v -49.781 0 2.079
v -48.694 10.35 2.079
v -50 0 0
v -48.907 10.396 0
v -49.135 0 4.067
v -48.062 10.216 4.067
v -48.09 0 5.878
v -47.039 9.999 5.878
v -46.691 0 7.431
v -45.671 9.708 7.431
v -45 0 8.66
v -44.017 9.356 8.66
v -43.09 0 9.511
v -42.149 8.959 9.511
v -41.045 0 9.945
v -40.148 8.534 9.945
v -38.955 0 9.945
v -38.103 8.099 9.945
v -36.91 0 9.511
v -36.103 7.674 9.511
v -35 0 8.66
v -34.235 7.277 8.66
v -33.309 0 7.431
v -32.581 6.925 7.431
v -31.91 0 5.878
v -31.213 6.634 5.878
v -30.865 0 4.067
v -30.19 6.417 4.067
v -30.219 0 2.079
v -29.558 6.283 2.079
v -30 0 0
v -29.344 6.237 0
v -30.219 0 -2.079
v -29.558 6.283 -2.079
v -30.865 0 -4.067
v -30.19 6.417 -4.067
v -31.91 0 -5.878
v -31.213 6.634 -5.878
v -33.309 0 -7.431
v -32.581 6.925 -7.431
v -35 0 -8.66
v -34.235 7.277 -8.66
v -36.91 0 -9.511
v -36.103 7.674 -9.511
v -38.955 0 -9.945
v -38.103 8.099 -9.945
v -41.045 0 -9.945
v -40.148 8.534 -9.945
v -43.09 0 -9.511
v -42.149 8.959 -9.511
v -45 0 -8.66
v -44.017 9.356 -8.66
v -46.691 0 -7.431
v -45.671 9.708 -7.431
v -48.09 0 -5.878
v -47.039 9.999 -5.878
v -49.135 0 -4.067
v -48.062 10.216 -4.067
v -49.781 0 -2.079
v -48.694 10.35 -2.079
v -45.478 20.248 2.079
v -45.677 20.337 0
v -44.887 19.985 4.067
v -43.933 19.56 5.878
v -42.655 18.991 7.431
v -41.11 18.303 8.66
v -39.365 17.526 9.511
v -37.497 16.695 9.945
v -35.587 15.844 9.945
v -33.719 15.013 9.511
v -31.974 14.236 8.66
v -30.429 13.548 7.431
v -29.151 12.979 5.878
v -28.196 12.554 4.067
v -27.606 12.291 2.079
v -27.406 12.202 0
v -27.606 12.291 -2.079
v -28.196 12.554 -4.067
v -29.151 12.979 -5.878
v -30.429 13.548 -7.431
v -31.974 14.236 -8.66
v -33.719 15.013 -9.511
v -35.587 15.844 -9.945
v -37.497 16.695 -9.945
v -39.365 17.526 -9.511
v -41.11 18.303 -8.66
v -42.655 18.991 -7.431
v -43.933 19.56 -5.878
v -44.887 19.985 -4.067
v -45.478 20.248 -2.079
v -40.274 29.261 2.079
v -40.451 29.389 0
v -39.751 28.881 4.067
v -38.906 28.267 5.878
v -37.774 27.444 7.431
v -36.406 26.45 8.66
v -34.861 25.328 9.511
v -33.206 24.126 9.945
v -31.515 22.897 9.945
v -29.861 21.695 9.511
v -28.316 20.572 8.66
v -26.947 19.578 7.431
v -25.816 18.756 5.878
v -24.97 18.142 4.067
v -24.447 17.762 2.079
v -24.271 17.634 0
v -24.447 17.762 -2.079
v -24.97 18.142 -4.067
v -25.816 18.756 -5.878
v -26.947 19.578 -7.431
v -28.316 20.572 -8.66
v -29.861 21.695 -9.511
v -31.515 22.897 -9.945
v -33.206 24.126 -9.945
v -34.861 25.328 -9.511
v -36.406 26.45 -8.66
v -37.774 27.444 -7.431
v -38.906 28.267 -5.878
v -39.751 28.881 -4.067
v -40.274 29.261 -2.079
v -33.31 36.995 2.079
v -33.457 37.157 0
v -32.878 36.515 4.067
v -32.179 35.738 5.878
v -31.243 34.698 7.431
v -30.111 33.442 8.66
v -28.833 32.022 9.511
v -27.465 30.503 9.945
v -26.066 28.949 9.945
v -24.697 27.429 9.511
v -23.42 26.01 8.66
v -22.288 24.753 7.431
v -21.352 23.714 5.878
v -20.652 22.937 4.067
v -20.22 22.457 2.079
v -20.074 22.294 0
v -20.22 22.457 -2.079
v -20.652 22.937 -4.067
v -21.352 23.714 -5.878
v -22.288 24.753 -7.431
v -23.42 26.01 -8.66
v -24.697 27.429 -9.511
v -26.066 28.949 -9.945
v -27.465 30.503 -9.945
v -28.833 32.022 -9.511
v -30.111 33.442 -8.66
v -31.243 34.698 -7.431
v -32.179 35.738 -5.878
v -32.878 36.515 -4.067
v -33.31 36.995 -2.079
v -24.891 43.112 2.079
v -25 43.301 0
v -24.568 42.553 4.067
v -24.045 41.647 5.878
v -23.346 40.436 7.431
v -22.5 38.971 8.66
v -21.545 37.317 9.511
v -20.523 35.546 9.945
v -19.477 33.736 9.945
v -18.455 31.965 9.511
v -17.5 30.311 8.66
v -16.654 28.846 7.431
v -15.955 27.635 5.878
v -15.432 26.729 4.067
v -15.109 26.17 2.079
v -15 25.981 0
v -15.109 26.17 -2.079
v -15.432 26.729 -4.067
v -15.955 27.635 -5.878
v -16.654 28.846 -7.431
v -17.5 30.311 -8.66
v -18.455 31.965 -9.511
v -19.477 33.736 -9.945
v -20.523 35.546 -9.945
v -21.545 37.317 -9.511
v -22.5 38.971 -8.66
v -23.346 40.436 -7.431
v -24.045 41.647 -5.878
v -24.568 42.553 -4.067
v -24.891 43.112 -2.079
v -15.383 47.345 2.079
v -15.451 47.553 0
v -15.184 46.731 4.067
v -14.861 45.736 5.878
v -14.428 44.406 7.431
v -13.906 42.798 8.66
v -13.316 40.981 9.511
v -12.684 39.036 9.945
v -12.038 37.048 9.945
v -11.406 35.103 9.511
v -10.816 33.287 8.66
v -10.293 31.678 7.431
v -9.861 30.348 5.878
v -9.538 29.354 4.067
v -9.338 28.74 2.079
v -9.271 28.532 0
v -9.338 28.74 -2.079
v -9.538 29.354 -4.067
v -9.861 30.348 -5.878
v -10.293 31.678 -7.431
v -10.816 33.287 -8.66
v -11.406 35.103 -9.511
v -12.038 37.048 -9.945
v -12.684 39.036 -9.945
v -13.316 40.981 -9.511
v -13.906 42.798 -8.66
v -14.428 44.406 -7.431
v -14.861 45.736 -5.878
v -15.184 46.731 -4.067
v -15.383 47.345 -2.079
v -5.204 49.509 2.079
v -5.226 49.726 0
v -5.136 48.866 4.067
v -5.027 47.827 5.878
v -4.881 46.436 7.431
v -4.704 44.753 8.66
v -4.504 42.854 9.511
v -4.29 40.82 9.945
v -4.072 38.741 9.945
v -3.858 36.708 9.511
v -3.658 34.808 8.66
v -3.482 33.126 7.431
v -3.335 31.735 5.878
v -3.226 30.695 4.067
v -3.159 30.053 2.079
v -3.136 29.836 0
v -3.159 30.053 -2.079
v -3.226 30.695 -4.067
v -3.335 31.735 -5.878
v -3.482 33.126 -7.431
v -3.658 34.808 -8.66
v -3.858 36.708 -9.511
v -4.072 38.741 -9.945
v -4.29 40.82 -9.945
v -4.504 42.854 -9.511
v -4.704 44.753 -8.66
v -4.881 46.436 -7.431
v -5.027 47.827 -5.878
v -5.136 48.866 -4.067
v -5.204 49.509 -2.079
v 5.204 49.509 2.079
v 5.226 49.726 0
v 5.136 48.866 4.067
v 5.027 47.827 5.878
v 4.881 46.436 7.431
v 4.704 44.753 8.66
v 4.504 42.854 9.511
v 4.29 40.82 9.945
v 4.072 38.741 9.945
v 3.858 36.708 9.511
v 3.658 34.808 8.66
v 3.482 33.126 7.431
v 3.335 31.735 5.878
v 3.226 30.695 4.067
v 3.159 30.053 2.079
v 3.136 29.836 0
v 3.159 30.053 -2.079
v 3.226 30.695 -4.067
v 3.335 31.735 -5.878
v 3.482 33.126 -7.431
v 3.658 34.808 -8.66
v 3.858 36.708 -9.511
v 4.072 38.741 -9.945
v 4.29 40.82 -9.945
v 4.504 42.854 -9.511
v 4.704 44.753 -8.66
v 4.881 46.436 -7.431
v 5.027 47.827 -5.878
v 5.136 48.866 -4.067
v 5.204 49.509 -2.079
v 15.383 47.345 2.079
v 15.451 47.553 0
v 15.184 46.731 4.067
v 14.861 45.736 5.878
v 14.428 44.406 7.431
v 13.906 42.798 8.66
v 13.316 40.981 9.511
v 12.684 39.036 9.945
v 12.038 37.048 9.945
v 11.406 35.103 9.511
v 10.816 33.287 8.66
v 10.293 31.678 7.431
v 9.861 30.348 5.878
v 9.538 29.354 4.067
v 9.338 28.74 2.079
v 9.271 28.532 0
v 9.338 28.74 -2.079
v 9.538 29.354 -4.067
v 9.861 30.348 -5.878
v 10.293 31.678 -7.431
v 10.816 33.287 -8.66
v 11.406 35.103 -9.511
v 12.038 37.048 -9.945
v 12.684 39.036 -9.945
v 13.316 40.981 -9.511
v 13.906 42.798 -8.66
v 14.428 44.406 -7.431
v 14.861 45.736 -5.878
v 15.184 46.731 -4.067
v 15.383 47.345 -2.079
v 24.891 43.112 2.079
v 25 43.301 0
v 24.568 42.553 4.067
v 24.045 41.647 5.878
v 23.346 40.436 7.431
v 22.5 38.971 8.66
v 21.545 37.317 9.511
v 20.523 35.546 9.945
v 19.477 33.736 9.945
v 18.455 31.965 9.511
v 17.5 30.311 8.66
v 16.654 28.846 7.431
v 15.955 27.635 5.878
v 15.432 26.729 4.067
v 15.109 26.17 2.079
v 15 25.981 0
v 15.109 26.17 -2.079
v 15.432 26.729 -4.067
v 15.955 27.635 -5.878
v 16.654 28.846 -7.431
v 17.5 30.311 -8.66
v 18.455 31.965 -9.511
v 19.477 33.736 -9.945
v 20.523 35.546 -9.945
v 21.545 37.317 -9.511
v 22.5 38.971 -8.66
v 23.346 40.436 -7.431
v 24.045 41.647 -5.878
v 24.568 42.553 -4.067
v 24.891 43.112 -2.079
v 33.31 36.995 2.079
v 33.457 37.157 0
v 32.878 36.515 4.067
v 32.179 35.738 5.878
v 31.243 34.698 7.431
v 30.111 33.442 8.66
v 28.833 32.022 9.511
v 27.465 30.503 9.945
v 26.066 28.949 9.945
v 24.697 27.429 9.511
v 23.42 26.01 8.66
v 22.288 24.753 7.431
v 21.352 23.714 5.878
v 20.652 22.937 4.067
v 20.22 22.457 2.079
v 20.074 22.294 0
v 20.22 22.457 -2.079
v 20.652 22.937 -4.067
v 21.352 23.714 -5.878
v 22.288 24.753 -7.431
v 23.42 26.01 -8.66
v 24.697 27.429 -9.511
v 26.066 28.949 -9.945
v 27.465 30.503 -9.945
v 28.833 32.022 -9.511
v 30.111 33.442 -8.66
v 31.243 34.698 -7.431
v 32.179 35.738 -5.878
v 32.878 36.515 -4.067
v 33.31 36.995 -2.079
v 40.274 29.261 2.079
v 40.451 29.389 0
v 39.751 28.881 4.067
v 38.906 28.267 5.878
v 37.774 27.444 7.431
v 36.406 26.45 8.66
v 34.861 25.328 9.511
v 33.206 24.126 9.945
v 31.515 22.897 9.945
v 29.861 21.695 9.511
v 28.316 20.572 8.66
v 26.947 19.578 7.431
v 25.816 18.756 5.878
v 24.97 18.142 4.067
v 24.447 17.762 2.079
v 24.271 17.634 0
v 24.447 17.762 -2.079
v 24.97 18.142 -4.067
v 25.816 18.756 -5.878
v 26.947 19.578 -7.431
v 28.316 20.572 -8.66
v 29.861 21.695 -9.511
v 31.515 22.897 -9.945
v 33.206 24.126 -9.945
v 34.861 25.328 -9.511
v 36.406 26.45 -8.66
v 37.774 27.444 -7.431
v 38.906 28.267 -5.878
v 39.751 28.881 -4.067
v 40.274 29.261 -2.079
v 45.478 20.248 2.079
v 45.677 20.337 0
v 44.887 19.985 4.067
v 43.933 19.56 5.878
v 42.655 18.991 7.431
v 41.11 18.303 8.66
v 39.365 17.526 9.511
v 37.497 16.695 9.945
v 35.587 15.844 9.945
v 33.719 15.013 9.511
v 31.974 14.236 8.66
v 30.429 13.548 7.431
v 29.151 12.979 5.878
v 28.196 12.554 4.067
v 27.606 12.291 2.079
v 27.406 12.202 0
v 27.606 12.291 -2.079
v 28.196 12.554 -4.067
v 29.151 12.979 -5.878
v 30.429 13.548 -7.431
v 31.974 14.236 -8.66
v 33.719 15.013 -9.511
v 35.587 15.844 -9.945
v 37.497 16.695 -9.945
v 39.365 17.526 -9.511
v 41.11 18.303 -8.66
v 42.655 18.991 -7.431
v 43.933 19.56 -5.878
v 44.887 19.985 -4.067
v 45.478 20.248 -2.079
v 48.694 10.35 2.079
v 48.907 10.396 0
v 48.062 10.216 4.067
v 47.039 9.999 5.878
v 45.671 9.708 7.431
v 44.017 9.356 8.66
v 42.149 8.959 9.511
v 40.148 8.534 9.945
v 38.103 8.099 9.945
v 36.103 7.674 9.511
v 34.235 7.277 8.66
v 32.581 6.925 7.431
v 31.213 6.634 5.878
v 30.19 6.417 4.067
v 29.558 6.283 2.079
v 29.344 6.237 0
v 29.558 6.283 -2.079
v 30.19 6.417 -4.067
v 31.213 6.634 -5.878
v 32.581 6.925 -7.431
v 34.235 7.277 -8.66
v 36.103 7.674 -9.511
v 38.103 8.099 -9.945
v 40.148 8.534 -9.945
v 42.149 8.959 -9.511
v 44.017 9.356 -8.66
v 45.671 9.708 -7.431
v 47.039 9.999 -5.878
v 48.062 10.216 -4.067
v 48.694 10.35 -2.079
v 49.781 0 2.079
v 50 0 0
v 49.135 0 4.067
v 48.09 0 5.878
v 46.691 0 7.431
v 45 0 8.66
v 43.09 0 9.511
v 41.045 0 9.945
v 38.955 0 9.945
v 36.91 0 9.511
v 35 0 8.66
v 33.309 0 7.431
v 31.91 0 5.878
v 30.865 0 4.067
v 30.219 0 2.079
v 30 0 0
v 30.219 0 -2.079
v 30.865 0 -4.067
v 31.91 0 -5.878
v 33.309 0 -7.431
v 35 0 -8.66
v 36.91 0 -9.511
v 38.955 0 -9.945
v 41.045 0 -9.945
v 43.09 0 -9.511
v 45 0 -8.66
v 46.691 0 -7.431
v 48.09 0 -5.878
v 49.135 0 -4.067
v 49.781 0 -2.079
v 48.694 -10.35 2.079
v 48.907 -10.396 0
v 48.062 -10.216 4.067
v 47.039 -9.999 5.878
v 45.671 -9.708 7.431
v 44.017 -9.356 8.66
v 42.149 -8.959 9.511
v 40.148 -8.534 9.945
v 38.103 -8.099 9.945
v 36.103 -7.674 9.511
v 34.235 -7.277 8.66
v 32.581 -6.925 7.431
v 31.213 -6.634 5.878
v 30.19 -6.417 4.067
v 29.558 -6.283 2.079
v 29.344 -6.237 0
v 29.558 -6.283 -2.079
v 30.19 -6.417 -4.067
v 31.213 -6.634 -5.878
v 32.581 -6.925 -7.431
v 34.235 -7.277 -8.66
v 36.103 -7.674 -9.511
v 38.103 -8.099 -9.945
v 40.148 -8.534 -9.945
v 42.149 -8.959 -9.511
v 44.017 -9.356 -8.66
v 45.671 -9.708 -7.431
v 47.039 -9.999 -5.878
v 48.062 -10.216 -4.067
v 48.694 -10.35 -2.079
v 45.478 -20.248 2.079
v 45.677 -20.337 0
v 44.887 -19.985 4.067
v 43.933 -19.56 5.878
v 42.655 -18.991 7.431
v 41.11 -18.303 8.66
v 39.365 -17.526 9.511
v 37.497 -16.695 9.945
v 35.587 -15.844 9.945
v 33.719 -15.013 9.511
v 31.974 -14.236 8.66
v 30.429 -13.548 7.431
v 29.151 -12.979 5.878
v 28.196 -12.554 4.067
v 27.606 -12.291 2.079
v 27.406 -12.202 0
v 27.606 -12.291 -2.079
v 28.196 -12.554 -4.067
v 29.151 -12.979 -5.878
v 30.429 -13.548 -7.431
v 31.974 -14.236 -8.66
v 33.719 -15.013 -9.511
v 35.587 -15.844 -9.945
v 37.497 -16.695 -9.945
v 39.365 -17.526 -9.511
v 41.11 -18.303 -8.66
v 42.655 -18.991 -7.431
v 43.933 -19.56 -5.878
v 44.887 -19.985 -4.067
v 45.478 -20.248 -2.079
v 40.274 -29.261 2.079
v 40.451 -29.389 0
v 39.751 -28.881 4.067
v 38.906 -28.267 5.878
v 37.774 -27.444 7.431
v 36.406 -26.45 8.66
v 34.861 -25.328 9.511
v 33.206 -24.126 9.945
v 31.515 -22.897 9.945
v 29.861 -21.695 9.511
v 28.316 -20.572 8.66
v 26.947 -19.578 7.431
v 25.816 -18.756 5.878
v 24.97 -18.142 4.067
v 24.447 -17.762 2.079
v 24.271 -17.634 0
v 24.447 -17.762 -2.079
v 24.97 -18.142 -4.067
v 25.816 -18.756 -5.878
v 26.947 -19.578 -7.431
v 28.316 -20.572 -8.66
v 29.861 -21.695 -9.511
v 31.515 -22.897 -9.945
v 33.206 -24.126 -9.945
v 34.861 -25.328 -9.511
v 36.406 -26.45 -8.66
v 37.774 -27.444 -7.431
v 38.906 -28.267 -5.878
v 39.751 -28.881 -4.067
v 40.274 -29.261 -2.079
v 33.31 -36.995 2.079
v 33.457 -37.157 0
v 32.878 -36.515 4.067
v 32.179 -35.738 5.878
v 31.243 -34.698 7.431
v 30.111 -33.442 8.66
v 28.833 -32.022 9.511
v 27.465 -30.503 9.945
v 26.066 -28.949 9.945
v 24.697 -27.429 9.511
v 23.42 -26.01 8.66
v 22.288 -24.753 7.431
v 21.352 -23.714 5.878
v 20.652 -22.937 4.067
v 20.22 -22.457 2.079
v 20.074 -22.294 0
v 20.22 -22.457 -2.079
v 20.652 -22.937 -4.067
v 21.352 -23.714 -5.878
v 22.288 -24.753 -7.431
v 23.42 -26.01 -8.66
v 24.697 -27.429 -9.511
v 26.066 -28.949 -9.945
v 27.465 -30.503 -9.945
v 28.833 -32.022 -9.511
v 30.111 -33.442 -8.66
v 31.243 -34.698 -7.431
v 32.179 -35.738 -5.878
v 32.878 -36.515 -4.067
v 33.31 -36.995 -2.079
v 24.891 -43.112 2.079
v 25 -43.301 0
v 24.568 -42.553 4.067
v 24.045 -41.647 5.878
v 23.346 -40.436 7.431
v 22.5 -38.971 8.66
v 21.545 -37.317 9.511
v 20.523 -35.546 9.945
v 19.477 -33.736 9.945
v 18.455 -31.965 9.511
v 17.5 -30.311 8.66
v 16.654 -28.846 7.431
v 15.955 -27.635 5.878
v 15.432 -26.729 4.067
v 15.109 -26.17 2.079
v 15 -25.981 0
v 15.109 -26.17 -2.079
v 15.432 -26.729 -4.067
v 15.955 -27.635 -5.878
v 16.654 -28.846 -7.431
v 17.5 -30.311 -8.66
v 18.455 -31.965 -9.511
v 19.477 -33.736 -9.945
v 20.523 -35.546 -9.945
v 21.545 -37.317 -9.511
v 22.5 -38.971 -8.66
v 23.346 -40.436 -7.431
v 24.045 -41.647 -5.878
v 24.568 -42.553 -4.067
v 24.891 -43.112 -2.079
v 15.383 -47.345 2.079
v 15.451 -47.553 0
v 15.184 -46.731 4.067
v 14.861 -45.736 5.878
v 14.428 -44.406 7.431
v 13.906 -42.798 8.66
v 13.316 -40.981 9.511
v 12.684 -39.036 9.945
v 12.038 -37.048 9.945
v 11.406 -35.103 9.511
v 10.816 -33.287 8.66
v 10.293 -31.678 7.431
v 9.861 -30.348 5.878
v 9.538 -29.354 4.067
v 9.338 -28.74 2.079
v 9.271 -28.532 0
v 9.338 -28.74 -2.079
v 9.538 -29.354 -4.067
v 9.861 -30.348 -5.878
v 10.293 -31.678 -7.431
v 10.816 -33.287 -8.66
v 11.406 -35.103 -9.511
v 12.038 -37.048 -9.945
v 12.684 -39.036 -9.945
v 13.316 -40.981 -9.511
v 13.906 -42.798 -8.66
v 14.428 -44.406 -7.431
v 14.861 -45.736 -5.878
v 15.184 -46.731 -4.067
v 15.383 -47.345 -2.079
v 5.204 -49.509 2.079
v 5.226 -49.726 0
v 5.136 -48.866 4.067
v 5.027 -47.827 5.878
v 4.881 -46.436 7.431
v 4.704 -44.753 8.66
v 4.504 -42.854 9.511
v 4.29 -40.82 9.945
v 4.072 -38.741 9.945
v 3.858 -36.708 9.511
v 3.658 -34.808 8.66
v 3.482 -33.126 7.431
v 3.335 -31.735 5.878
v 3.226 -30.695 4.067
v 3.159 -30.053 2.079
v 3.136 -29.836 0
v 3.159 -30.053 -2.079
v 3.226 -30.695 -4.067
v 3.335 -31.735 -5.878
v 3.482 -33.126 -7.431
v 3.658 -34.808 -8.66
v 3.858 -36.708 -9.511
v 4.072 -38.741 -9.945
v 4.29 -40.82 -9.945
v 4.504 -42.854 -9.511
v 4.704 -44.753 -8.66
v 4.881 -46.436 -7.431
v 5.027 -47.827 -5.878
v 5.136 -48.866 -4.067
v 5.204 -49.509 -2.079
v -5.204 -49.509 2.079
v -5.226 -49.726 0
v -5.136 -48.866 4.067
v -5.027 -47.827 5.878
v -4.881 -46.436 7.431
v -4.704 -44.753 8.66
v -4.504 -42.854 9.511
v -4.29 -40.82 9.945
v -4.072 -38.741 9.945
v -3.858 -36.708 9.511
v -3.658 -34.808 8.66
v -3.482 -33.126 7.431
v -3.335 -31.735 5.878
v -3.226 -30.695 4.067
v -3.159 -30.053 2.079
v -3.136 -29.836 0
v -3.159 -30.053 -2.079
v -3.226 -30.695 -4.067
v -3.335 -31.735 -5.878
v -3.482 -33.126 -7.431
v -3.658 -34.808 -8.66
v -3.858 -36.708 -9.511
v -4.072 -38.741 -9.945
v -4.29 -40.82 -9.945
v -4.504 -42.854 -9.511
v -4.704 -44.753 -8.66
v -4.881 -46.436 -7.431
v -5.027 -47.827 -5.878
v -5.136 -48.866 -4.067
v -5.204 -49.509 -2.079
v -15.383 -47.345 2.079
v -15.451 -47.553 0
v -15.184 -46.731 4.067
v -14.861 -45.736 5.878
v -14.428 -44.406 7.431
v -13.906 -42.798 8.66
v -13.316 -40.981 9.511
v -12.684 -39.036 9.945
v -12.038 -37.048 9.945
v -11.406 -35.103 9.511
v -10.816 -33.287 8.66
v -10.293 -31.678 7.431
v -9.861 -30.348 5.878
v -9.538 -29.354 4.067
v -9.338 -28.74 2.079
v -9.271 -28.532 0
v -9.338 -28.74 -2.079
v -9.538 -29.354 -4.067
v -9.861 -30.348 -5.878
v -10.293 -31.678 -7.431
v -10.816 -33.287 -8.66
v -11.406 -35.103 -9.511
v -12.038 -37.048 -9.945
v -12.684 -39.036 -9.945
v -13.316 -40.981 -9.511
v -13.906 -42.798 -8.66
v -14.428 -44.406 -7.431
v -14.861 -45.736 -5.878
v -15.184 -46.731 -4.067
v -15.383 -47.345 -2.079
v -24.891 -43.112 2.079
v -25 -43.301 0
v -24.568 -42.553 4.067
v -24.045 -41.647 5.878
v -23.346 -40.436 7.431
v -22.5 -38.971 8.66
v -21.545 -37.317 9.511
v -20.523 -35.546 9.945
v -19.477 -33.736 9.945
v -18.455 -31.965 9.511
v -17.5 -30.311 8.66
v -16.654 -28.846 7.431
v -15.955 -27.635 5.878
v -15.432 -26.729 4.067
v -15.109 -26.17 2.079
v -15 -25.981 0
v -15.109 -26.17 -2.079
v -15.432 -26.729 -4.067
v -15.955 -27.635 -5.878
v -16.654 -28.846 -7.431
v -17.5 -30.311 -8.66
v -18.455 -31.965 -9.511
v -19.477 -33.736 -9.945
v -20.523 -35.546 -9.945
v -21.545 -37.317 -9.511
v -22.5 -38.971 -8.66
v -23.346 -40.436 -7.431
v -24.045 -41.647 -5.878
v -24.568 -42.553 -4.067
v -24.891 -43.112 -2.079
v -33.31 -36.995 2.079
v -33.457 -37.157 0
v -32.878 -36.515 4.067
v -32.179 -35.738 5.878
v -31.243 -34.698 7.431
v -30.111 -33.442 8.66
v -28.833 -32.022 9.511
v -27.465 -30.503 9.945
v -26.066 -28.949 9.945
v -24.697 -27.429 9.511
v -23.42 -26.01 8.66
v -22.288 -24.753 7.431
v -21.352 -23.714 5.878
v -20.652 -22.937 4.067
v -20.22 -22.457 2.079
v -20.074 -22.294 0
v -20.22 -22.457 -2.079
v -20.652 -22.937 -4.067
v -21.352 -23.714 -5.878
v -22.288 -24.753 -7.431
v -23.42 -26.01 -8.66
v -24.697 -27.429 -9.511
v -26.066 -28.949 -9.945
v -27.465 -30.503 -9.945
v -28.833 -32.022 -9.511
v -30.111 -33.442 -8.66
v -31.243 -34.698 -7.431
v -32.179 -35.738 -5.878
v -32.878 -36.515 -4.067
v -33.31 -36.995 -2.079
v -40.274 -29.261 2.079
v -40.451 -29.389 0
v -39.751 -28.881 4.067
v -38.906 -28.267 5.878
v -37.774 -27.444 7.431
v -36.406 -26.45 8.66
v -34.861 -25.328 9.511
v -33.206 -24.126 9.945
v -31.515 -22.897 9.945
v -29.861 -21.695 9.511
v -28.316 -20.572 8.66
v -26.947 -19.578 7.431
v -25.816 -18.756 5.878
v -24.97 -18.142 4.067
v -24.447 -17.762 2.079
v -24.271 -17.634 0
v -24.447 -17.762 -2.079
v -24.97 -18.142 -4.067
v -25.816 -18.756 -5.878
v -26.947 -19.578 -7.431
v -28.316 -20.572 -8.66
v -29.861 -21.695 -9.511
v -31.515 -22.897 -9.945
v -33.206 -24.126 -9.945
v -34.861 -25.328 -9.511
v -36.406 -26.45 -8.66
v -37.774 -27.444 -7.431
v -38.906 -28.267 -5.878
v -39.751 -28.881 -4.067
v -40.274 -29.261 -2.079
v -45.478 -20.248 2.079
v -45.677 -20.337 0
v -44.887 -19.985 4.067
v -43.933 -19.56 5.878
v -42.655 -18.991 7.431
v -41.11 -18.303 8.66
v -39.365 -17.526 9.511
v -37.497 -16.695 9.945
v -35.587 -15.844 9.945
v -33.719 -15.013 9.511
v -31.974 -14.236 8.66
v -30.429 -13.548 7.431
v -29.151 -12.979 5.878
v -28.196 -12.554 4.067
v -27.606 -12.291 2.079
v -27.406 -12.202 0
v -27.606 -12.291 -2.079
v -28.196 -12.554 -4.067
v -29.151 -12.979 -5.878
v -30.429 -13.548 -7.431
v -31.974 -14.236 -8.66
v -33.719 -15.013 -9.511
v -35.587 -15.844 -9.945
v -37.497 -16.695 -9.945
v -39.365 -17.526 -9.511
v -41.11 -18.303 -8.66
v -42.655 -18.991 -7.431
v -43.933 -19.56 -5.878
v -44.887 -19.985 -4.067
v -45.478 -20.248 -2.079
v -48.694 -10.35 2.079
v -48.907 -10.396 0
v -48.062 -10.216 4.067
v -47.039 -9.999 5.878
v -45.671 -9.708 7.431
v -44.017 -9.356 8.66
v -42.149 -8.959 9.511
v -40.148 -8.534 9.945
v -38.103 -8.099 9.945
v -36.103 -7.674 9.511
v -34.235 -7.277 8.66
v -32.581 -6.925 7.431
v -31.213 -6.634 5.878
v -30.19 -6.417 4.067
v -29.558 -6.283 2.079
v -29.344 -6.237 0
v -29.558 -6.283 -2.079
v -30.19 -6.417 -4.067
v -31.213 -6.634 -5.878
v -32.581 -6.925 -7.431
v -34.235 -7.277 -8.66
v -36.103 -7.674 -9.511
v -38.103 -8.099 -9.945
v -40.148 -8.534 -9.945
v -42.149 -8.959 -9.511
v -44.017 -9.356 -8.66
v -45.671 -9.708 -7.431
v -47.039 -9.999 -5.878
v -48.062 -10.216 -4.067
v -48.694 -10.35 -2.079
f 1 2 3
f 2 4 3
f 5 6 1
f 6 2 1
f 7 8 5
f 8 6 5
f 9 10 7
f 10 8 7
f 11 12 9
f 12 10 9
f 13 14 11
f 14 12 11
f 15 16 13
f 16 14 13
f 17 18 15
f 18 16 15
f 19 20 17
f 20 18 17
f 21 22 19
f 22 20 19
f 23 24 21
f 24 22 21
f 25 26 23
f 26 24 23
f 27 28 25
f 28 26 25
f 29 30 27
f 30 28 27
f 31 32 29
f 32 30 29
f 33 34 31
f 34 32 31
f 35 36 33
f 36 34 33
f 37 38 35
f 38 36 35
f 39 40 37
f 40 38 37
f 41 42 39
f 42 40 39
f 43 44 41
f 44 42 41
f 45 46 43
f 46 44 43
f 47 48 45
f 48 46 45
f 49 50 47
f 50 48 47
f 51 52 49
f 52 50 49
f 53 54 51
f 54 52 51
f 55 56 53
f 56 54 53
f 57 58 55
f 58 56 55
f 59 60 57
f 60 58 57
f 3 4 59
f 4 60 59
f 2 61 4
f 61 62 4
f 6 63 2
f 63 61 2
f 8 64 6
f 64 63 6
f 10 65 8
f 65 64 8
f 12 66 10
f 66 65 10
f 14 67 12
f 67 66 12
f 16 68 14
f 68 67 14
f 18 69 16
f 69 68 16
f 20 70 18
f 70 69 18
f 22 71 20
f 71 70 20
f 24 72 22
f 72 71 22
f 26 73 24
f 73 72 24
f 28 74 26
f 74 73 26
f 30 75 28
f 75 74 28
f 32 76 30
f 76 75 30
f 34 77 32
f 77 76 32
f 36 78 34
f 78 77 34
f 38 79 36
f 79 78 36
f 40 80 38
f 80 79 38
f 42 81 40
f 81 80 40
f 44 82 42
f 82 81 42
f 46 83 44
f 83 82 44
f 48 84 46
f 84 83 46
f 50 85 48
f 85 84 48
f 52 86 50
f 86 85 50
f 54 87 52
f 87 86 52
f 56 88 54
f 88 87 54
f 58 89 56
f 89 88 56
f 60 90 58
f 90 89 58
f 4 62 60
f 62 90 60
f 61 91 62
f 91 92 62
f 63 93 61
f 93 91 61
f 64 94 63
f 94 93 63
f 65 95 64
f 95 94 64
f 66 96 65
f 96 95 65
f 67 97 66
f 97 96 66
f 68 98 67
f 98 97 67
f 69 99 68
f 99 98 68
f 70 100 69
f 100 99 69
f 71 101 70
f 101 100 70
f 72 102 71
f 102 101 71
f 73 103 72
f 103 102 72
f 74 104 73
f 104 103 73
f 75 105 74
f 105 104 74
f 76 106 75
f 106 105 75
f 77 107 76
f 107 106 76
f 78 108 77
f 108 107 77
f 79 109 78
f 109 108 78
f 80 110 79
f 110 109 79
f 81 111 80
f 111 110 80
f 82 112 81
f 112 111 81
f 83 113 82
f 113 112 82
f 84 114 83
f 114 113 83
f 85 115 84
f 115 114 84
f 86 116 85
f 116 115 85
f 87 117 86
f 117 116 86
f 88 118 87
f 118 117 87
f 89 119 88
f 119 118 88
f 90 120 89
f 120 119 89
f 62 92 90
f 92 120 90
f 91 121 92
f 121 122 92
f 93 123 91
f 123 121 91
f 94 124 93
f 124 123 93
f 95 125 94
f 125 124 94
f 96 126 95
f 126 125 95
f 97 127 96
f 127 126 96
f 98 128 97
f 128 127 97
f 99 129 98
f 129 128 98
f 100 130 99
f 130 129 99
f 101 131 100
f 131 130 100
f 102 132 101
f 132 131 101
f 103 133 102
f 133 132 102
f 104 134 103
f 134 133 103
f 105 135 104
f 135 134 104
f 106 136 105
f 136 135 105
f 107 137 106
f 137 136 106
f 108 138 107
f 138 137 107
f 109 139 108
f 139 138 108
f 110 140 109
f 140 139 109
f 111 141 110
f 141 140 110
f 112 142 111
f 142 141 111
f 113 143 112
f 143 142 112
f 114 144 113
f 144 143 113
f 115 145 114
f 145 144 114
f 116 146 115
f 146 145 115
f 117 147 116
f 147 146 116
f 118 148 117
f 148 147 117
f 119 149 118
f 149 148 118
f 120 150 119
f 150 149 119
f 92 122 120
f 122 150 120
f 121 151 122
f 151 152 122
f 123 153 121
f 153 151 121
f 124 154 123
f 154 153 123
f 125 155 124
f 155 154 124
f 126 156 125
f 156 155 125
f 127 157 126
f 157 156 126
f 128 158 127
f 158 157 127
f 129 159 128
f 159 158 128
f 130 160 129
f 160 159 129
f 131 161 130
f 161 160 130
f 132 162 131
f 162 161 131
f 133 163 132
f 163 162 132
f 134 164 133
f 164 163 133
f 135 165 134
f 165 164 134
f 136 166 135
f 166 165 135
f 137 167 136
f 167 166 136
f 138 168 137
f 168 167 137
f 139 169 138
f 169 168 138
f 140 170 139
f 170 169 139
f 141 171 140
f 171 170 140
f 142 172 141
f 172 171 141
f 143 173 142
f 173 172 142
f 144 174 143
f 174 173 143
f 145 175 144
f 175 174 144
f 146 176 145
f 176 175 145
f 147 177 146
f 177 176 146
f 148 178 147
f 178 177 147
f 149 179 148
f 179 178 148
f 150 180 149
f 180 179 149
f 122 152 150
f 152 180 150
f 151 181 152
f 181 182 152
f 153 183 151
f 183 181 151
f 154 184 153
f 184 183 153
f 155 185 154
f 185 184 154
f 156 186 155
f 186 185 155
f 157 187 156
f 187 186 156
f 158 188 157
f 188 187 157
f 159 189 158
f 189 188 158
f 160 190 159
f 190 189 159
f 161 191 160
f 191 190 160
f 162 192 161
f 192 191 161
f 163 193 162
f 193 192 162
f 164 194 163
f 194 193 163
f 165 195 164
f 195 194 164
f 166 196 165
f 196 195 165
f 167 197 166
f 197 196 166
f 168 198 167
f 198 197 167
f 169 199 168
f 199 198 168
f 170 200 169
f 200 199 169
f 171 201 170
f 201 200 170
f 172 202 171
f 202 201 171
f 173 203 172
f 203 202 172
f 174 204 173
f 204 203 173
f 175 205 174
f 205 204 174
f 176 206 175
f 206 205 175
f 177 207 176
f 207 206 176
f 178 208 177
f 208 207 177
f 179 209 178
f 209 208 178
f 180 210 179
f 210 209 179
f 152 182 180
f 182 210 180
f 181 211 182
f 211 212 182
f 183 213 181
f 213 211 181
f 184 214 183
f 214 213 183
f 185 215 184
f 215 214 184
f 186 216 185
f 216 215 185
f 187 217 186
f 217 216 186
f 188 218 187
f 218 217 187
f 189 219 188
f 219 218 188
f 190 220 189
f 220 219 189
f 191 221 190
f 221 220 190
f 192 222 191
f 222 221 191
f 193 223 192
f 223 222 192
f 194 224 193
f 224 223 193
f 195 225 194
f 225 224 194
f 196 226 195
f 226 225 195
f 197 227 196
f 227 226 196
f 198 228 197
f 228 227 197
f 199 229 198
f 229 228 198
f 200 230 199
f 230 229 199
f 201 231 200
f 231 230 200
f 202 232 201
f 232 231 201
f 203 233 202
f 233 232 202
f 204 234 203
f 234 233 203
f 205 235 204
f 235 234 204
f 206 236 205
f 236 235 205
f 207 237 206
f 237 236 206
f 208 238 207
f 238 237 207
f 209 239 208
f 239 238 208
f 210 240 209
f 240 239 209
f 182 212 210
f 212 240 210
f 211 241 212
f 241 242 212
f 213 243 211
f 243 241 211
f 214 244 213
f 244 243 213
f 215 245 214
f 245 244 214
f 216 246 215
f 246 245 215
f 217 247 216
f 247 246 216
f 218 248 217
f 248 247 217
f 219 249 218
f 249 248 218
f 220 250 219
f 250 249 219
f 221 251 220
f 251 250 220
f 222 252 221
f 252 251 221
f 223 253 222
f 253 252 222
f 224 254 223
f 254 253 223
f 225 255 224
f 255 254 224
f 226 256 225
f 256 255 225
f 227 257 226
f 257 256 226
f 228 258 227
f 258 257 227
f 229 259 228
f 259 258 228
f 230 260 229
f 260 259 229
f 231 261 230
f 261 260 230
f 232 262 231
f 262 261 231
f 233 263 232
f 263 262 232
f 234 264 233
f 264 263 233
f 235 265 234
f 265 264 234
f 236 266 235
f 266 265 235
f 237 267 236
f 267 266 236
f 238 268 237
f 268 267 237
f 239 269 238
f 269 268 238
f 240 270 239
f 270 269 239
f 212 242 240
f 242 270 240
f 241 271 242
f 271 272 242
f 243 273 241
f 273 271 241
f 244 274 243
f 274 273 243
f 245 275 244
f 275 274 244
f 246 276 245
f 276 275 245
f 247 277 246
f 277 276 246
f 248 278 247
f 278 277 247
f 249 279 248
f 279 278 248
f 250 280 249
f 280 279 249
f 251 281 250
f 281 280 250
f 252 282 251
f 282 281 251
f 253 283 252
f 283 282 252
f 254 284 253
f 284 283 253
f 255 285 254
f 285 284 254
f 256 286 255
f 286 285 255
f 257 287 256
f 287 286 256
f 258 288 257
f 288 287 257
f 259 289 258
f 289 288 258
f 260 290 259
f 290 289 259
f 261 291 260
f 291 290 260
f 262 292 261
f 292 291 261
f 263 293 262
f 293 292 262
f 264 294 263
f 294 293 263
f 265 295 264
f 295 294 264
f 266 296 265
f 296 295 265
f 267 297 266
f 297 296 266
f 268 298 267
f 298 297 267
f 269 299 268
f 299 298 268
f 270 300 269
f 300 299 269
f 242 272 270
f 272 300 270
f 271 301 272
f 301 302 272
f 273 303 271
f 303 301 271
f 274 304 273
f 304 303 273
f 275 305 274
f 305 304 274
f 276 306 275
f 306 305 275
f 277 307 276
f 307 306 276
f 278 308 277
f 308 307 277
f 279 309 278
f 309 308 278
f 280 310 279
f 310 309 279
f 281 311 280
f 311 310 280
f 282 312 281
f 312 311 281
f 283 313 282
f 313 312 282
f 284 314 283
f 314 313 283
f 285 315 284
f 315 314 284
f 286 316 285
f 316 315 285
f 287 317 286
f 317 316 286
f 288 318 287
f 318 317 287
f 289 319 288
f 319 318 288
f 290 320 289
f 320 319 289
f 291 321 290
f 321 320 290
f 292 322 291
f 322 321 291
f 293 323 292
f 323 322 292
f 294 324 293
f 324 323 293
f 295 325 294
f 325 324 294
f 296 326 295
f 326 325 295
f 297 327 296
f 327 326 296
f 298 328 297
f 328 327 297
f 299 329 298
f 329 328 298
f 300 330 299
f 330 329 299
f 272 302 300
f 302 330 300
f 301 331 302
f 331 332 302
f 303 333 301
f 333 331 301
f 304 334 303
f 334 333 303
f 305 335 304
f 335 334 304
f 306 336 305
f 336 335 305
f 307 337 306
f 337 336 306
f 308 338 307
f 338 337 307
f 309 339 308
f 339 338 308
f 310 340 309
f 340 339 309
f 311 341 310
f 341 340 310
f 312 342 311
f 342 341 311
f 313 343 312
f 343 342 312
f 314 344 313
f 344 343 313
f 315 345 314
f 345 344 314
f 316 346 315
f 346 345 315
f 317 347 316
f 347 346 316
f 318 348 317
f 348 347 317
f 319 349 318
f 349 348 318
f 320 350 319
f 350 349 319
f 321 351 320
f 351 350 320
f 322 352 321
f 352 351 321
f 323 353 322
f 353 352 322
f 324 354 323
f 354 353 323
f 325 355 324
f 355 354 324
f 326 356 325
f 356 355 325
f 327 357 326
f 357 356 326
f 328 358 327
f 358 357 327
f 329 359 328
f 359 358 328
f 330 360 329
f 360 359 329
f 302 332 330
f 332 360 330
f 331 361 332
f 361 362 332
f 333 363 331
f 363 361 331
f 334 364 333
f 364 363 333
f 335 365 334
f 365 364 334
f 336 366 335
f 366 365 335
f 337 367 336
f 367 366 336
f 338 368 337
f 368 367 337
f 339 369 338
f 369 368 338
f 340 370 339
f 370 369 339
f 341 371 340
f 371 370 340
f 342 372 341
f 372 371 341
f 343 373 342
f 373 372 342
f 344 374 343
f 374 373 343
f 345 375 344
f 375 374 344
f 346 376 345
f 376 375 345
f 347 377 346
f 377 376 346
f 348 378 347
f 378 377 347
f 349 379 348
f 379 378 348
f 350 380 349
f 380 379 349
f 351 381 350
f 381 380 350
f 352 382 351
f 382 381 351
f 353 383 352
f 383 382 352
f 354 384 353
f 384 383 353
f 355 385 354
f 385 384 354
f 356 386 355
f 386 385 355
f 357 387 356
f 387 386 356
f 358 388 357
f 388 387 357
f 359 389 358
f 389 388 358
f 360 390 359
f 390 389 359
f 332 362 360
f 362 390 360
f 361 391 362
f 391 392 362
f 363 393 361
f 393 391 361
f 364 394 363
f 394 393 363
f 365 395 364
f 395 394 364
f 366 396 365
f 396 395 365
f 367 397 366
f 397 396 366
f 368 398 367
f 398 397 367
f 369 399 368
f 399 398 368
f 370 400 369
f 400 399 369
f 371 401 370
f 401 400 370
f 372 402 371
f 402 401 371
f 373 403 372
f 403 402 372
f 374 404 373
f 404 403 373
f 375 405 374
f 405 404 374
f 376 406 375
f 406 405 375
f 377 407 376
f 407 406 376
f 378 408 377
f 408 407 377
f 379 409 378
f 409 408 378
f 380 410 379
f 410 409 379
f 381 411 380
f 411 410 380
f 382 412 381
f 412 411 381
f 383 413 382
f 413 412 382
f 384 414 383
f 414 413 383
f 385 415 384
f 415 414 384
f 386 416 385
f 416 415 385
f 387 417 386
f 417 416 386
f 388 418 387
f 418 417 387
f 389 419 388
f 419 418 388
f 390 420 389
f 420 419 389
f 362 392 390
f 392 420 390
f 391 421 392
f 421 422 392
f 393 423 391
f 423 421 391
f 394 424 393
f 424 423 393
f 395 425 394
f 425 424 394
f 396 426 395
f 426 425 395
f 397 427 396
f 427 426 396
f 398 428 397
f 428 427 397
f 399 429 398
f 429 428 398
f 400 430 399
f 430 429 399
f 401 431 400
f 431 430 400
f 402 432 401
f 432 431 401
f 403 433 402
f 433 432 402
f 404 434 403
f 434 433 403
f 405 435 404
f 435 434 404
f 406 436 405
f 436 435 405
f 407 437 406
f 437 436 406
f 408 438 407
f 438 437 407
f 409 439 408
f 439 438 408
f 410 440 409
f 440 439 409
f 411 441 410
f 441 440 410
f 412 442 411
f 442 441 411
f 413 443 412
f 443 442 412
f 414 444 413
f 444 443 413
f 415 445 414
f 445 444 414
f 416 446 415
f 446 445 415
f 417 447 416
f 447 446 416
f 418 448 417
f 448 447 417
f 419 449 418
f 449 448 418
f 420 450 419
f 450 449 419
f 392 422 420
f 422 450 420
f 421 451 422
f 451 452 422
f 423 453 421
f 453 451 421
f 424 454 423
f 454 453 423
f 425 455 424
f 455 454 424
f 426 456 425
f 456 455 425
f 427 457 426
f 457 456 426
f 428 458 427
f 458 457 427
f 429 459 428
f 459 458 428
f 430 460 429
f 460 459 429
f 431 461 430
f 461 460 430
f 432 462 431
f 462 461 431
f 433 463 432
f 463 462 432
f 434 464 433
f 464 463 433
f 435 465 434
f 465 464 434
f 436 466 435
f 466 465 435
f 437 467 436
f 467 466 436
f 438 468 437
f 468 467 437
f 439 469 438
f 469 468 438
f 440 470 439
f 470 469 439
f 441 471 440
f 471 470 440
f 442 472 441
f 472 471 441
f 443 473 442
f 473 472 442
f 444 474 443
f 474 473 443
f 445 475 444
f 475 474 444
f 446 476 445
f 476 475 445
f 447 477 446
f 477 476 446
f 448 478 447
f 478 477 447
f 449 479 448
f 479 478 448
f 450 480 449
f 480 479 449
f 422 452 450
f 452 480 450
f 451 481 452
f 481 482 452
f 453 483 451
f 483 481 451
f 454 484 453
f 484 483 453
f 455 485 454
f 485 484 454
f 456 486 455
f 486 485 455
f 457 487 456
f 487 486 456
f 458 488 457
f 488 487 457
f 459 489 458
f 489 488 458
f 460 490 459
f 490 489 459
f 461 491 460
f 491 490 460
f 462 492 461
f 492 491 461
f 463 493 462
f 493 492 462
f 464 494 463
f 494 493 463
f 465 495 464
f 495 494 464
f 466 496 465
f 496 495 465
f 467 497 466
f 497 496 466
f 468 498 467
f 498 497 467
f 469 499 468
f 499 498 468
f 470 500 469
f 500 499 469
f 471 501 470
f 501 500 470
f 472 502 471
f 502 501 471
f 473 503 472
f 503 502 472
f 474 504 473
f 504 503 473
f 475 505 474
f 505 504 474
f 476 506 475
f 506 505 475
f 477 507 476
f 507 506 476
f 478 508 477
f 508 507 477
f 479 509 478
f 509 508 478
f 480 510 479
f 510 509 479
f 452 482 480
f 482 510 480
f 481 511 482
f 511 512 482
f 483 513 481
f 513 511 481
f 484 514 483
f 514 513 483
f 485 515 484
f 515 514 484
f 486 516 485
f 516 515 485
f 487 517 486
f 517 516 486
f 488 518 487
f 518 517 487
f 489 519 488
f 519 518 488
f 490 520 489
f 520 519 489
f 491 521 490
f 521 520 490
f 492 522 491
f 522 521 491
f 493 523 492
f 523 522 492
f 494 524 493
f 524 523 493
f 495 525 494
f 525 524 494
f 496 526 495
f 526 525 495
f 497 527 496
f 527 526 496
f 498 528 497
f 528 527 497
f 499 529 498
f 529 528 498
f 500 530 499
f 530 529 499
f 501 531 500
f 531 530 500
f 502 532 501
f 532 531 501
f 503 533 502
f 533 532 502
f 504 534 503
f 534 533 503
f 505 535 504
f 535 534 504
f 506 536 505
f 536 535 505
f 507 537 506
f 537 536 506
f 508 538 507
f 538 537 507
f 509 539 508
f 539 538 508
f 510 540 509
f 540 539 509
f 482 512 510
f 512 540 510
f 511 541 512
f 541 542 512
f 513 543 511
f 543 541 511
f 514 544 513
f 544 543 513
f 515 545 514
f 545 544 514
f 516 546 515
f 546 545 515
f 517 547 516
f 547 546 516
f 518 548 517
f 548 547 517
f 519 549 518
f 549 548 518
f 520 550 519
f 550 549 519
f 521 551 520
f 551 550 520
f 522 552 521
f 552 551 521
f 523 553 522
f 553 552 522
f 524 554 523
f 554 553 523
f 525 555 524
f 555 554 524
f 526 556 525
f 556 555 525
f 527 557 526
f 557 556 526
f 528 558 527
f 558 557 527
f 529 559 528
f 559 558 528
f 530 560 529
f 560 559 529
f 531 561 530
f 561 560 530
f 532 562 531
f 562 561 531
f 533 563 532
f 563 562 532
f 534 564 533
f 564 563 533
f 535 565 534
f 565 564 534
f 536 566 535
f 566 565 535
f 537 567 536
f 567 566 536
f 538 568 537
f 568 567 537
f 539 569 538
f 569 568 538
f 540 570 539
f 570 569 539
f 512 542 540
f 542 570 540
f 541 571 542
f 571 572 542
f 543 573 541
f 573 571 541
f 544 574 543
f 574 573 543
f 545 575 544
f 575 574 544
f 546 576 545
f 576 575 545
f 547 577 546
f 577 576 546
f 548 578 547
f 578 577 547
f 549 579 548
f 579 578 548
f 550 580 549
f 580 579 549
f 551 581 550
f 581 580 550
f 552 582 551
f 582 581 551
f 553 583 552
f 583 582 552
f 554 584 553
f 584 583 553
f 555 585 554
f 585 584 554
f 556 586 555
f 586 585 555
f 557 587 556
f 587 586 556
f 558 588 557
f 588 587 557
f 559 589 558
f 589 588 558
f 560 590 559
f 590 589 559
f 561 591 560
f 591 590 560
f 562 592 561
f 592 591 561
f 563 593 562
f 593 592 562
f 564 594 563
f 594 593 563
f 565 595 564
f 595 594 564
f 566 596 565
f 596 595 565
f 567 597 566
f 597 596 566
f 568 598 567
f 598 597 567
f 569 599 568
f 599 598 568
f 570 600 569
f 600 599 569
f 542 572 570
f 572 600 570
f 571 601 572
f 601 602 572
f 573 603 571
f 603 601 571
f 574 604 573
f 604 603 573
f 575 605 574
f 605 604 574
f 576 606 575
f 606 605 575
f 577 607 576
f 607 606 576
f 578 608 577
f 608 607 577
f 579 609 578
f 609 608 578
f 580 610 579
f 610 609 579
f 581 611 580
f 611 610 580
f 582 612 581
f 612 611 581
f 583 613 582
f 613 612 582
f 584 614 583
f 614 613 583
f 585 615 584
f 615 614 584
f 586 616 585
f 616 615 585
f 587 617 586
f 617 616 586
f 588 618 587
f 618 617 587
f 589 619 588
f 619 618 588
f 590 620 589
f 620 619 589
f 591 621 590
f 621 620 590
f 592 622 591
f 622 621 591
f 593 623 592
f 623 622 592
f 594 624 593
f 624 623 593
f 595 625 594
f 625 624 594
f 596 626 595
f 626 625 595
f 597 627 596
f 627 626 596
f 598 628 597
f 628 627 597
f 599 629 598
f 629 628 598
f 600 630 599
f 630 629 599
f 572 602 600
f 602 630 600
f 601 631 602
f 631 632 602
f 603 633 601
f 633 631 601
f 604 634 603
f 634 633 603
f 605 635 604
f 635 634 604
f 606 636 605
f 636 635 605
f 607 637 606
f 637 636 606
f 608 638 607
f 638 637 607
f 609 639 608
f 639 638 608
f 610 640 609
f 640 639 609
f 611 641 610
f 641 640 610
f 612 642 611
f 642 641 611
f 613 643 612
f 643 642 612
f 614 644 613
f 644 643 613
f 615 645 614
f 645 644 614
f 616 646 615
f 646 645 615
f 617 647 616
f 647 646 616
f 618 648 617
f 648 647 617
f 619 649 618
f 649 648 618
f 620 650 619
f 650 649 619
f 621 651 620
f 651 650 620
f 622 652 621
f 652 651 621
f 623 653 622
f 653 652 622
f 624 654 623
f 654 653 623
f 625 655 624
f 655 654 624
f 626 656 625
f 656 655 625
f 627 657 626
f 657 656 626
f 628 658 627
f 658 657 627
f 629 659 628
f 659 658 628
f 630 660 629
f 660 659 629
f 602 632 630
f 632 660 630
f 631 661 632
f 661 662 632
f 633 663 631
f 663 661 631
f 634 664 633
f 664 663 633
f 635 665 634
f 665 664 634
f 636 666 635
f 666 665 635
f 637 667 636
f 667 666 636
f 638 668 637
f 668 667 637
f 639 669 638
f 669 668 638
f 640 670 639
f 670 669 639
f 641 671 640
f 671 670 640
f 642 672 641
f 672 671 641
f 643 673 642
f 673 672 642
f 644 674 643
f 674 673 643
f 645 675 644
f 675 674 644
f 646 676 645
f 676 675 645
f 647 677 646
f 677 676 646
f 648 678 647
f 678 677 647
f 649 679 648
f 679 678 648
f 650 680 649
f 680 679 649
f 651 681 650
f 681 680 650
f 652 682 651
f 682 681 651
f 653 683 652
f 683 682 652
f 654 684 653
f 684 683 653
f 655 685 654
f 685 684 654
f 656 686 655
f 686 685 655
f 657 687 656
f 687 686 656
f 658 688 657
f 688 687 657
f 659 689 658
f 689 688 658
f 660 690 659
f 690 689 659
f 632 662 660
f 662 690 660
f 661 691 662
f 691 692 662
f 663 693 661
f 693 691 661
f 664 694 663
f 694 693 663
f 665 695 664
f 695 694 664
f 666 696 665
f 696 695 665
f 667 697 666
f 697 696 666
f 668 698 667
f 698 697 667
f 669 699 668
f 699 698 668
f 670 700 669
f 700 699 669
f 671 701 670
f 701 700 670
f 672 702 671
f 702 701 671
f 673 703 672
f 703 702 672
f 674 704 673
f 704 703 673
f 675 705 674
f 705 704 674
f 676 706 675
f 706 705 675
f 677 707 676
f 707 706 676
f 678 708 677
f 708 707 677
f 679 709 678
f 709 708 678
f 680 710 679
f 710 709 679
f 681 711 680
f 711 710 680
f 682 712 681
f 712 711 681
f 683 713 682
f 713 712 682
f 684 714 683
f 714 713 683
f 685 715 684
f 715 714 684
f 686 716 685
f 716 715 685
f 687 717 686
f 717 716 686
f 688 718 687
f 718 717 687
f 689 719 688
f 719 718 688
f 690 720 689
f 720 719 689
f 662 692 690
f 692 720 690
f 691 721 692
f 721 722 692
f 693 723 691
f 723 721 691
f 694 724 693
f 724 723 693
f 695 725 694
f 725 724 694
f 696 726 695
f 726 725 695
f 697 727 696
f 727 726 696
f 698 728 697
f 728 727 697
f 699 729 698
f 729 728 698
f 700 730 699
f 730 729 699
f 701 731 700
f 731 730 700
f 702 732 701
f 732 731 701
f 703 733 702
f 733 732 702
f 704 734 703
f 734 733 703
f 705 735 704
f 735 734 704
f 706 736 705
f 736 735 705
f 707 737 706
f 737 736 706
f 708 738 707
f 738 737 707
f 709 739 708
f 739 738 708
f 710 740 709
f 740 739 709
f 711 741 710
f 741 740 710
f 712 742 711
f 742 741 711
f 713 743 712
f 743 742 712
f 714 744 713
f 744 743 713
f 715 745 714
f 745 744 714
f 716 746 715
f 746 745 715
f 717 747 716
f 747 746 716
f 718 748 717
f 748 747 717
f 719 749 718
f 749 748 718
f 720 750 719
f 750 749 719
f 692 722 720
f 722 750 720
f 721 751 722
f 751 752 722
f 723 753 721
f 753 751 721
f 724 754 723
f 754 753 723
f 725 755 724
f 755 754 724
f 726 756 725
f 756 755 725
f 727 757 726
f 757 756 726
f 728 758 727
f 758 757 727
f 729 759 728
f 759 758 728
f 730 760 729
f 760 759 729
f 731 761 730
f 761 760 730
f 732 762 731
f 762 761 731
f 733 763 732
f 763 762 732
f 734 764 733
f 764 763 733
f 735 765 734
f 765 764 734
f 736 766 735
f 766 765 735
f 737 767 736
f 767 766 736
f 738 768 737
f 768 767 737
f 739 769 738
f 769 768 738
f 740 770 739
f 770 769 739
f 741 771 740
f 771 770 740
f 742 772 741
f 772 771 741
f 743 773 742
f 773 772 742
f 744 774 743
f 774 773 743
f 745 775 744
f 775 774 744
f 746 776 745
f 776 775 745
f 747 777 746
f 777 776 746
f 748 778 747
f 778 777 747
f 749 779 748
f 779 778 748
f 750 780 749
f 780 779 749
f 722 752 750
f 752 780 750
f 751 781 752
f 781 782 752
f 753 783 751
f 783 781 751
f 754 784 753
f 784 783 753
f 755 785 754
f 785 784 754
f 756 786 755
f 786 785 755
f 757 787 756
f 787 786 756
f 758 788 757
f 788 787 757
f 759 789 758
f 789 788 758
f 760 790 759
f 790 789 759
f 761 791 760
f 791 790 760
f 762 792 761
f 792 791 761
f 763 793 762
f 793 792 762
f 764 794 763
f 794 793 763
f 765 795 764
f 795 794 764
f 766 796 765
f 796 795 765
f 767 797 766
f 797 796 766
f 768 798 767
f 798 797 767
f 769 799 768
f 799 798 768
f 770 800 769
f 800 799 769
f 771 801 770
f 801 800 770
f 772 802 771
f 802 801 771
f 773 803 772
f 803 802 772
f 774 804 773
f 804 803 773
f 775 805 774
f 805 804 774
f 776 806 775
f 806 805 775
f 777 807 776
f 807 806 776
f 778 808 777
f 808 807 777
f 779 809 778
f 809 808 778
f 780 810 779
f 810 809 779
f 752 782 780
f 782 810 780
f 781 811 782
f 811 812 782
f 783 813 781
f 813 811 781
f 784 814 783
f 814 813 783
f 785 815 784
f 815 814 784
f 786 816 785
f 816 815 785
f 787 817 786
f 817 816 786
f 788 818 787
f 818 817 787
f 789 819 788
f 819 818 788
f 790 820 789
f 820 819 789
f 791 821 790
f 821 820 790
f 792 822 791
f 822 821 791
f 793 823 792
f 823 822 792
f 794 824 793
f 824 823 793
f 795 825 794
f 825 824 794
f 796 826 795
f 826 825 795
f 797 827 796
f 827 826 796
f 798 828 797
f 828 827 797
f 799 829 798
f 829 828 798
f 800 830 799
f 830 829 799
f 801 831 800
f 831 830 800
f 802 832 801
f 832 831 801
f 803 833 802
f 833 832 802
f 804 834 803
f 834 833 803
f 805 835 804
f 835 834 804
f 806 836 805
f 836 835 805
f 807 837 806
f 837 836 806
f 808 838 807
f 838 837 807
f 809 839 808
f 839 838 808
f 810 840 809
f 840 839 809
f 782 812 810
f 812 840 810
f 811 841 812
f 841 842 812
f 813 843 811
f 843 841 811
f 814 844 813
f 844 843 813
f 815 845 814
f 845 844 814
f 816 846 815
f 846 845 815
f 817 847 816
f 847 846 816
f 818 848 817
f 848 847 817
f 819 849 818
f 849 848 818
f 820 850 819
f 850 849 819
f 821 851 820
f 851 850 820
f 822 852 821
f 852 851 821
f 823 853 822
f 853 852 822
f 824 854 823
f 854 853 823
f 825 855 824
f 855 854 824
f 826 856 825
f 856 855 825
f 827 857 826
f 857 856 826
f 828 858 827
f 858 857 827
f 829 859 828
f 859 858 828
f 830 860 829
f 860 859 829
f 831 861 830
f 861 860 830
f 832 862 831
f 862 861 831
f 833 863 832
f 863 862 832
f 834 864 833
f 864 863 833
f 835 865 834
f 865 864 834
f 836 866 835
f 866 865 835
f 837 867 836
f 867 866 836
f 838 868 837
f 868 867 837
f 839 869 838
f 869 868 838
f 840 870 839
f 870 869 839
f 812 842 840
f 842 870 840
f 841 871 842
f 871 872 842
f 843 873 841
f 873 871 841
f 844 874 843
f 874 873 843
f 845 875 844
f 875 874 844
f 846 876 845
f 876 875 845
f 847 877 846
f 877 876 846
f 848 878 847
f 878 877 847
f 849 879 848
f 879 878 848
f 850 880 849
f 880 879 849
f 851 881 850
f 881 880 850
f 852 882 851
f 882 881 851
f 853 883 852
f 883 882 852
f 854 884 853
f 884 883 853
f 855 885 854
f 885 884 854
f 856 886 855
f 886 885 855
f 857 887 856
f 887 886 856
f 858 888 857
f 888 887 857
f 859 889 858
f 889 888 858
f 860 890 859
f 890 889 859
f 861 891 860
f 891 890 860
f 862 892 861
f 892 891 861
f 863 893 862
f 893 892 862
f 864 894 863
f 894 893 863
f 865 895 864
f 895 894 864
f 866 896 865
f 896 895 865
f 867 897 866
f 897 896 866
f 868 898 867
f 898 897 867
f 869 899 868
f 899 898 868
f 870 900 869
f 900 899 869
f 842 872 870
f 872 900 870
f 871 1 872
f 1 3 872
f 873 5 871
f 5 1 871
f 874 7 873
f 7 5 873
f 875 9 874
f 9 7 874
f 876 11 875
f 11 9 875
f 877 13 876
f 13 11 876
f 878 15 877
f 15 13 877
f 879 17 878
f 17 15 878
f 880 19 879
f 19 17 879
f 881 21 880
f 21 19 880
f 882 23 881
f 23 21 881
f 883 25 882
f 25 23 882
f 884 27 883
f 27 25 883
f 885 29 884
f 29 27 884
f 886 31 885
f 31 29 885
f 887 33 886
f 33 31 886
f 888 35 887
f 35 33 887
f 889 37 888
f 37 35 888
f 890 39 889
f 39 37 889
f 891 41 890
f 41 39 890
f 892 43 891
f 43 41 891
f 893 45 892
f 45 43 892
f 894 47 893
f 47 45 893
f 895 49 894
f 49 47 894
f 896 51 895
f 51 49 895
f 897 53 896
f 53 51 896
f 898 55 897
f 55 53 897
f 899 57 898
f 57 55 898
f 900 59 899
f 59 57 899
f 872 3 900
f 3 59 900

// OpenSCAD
circlesize = 10; // [0:100]
circletranslate = 40; // [0:100]

rotate_extrude(convexity=10)
    translate([circletranslate, 0]) circle(circlesize);
